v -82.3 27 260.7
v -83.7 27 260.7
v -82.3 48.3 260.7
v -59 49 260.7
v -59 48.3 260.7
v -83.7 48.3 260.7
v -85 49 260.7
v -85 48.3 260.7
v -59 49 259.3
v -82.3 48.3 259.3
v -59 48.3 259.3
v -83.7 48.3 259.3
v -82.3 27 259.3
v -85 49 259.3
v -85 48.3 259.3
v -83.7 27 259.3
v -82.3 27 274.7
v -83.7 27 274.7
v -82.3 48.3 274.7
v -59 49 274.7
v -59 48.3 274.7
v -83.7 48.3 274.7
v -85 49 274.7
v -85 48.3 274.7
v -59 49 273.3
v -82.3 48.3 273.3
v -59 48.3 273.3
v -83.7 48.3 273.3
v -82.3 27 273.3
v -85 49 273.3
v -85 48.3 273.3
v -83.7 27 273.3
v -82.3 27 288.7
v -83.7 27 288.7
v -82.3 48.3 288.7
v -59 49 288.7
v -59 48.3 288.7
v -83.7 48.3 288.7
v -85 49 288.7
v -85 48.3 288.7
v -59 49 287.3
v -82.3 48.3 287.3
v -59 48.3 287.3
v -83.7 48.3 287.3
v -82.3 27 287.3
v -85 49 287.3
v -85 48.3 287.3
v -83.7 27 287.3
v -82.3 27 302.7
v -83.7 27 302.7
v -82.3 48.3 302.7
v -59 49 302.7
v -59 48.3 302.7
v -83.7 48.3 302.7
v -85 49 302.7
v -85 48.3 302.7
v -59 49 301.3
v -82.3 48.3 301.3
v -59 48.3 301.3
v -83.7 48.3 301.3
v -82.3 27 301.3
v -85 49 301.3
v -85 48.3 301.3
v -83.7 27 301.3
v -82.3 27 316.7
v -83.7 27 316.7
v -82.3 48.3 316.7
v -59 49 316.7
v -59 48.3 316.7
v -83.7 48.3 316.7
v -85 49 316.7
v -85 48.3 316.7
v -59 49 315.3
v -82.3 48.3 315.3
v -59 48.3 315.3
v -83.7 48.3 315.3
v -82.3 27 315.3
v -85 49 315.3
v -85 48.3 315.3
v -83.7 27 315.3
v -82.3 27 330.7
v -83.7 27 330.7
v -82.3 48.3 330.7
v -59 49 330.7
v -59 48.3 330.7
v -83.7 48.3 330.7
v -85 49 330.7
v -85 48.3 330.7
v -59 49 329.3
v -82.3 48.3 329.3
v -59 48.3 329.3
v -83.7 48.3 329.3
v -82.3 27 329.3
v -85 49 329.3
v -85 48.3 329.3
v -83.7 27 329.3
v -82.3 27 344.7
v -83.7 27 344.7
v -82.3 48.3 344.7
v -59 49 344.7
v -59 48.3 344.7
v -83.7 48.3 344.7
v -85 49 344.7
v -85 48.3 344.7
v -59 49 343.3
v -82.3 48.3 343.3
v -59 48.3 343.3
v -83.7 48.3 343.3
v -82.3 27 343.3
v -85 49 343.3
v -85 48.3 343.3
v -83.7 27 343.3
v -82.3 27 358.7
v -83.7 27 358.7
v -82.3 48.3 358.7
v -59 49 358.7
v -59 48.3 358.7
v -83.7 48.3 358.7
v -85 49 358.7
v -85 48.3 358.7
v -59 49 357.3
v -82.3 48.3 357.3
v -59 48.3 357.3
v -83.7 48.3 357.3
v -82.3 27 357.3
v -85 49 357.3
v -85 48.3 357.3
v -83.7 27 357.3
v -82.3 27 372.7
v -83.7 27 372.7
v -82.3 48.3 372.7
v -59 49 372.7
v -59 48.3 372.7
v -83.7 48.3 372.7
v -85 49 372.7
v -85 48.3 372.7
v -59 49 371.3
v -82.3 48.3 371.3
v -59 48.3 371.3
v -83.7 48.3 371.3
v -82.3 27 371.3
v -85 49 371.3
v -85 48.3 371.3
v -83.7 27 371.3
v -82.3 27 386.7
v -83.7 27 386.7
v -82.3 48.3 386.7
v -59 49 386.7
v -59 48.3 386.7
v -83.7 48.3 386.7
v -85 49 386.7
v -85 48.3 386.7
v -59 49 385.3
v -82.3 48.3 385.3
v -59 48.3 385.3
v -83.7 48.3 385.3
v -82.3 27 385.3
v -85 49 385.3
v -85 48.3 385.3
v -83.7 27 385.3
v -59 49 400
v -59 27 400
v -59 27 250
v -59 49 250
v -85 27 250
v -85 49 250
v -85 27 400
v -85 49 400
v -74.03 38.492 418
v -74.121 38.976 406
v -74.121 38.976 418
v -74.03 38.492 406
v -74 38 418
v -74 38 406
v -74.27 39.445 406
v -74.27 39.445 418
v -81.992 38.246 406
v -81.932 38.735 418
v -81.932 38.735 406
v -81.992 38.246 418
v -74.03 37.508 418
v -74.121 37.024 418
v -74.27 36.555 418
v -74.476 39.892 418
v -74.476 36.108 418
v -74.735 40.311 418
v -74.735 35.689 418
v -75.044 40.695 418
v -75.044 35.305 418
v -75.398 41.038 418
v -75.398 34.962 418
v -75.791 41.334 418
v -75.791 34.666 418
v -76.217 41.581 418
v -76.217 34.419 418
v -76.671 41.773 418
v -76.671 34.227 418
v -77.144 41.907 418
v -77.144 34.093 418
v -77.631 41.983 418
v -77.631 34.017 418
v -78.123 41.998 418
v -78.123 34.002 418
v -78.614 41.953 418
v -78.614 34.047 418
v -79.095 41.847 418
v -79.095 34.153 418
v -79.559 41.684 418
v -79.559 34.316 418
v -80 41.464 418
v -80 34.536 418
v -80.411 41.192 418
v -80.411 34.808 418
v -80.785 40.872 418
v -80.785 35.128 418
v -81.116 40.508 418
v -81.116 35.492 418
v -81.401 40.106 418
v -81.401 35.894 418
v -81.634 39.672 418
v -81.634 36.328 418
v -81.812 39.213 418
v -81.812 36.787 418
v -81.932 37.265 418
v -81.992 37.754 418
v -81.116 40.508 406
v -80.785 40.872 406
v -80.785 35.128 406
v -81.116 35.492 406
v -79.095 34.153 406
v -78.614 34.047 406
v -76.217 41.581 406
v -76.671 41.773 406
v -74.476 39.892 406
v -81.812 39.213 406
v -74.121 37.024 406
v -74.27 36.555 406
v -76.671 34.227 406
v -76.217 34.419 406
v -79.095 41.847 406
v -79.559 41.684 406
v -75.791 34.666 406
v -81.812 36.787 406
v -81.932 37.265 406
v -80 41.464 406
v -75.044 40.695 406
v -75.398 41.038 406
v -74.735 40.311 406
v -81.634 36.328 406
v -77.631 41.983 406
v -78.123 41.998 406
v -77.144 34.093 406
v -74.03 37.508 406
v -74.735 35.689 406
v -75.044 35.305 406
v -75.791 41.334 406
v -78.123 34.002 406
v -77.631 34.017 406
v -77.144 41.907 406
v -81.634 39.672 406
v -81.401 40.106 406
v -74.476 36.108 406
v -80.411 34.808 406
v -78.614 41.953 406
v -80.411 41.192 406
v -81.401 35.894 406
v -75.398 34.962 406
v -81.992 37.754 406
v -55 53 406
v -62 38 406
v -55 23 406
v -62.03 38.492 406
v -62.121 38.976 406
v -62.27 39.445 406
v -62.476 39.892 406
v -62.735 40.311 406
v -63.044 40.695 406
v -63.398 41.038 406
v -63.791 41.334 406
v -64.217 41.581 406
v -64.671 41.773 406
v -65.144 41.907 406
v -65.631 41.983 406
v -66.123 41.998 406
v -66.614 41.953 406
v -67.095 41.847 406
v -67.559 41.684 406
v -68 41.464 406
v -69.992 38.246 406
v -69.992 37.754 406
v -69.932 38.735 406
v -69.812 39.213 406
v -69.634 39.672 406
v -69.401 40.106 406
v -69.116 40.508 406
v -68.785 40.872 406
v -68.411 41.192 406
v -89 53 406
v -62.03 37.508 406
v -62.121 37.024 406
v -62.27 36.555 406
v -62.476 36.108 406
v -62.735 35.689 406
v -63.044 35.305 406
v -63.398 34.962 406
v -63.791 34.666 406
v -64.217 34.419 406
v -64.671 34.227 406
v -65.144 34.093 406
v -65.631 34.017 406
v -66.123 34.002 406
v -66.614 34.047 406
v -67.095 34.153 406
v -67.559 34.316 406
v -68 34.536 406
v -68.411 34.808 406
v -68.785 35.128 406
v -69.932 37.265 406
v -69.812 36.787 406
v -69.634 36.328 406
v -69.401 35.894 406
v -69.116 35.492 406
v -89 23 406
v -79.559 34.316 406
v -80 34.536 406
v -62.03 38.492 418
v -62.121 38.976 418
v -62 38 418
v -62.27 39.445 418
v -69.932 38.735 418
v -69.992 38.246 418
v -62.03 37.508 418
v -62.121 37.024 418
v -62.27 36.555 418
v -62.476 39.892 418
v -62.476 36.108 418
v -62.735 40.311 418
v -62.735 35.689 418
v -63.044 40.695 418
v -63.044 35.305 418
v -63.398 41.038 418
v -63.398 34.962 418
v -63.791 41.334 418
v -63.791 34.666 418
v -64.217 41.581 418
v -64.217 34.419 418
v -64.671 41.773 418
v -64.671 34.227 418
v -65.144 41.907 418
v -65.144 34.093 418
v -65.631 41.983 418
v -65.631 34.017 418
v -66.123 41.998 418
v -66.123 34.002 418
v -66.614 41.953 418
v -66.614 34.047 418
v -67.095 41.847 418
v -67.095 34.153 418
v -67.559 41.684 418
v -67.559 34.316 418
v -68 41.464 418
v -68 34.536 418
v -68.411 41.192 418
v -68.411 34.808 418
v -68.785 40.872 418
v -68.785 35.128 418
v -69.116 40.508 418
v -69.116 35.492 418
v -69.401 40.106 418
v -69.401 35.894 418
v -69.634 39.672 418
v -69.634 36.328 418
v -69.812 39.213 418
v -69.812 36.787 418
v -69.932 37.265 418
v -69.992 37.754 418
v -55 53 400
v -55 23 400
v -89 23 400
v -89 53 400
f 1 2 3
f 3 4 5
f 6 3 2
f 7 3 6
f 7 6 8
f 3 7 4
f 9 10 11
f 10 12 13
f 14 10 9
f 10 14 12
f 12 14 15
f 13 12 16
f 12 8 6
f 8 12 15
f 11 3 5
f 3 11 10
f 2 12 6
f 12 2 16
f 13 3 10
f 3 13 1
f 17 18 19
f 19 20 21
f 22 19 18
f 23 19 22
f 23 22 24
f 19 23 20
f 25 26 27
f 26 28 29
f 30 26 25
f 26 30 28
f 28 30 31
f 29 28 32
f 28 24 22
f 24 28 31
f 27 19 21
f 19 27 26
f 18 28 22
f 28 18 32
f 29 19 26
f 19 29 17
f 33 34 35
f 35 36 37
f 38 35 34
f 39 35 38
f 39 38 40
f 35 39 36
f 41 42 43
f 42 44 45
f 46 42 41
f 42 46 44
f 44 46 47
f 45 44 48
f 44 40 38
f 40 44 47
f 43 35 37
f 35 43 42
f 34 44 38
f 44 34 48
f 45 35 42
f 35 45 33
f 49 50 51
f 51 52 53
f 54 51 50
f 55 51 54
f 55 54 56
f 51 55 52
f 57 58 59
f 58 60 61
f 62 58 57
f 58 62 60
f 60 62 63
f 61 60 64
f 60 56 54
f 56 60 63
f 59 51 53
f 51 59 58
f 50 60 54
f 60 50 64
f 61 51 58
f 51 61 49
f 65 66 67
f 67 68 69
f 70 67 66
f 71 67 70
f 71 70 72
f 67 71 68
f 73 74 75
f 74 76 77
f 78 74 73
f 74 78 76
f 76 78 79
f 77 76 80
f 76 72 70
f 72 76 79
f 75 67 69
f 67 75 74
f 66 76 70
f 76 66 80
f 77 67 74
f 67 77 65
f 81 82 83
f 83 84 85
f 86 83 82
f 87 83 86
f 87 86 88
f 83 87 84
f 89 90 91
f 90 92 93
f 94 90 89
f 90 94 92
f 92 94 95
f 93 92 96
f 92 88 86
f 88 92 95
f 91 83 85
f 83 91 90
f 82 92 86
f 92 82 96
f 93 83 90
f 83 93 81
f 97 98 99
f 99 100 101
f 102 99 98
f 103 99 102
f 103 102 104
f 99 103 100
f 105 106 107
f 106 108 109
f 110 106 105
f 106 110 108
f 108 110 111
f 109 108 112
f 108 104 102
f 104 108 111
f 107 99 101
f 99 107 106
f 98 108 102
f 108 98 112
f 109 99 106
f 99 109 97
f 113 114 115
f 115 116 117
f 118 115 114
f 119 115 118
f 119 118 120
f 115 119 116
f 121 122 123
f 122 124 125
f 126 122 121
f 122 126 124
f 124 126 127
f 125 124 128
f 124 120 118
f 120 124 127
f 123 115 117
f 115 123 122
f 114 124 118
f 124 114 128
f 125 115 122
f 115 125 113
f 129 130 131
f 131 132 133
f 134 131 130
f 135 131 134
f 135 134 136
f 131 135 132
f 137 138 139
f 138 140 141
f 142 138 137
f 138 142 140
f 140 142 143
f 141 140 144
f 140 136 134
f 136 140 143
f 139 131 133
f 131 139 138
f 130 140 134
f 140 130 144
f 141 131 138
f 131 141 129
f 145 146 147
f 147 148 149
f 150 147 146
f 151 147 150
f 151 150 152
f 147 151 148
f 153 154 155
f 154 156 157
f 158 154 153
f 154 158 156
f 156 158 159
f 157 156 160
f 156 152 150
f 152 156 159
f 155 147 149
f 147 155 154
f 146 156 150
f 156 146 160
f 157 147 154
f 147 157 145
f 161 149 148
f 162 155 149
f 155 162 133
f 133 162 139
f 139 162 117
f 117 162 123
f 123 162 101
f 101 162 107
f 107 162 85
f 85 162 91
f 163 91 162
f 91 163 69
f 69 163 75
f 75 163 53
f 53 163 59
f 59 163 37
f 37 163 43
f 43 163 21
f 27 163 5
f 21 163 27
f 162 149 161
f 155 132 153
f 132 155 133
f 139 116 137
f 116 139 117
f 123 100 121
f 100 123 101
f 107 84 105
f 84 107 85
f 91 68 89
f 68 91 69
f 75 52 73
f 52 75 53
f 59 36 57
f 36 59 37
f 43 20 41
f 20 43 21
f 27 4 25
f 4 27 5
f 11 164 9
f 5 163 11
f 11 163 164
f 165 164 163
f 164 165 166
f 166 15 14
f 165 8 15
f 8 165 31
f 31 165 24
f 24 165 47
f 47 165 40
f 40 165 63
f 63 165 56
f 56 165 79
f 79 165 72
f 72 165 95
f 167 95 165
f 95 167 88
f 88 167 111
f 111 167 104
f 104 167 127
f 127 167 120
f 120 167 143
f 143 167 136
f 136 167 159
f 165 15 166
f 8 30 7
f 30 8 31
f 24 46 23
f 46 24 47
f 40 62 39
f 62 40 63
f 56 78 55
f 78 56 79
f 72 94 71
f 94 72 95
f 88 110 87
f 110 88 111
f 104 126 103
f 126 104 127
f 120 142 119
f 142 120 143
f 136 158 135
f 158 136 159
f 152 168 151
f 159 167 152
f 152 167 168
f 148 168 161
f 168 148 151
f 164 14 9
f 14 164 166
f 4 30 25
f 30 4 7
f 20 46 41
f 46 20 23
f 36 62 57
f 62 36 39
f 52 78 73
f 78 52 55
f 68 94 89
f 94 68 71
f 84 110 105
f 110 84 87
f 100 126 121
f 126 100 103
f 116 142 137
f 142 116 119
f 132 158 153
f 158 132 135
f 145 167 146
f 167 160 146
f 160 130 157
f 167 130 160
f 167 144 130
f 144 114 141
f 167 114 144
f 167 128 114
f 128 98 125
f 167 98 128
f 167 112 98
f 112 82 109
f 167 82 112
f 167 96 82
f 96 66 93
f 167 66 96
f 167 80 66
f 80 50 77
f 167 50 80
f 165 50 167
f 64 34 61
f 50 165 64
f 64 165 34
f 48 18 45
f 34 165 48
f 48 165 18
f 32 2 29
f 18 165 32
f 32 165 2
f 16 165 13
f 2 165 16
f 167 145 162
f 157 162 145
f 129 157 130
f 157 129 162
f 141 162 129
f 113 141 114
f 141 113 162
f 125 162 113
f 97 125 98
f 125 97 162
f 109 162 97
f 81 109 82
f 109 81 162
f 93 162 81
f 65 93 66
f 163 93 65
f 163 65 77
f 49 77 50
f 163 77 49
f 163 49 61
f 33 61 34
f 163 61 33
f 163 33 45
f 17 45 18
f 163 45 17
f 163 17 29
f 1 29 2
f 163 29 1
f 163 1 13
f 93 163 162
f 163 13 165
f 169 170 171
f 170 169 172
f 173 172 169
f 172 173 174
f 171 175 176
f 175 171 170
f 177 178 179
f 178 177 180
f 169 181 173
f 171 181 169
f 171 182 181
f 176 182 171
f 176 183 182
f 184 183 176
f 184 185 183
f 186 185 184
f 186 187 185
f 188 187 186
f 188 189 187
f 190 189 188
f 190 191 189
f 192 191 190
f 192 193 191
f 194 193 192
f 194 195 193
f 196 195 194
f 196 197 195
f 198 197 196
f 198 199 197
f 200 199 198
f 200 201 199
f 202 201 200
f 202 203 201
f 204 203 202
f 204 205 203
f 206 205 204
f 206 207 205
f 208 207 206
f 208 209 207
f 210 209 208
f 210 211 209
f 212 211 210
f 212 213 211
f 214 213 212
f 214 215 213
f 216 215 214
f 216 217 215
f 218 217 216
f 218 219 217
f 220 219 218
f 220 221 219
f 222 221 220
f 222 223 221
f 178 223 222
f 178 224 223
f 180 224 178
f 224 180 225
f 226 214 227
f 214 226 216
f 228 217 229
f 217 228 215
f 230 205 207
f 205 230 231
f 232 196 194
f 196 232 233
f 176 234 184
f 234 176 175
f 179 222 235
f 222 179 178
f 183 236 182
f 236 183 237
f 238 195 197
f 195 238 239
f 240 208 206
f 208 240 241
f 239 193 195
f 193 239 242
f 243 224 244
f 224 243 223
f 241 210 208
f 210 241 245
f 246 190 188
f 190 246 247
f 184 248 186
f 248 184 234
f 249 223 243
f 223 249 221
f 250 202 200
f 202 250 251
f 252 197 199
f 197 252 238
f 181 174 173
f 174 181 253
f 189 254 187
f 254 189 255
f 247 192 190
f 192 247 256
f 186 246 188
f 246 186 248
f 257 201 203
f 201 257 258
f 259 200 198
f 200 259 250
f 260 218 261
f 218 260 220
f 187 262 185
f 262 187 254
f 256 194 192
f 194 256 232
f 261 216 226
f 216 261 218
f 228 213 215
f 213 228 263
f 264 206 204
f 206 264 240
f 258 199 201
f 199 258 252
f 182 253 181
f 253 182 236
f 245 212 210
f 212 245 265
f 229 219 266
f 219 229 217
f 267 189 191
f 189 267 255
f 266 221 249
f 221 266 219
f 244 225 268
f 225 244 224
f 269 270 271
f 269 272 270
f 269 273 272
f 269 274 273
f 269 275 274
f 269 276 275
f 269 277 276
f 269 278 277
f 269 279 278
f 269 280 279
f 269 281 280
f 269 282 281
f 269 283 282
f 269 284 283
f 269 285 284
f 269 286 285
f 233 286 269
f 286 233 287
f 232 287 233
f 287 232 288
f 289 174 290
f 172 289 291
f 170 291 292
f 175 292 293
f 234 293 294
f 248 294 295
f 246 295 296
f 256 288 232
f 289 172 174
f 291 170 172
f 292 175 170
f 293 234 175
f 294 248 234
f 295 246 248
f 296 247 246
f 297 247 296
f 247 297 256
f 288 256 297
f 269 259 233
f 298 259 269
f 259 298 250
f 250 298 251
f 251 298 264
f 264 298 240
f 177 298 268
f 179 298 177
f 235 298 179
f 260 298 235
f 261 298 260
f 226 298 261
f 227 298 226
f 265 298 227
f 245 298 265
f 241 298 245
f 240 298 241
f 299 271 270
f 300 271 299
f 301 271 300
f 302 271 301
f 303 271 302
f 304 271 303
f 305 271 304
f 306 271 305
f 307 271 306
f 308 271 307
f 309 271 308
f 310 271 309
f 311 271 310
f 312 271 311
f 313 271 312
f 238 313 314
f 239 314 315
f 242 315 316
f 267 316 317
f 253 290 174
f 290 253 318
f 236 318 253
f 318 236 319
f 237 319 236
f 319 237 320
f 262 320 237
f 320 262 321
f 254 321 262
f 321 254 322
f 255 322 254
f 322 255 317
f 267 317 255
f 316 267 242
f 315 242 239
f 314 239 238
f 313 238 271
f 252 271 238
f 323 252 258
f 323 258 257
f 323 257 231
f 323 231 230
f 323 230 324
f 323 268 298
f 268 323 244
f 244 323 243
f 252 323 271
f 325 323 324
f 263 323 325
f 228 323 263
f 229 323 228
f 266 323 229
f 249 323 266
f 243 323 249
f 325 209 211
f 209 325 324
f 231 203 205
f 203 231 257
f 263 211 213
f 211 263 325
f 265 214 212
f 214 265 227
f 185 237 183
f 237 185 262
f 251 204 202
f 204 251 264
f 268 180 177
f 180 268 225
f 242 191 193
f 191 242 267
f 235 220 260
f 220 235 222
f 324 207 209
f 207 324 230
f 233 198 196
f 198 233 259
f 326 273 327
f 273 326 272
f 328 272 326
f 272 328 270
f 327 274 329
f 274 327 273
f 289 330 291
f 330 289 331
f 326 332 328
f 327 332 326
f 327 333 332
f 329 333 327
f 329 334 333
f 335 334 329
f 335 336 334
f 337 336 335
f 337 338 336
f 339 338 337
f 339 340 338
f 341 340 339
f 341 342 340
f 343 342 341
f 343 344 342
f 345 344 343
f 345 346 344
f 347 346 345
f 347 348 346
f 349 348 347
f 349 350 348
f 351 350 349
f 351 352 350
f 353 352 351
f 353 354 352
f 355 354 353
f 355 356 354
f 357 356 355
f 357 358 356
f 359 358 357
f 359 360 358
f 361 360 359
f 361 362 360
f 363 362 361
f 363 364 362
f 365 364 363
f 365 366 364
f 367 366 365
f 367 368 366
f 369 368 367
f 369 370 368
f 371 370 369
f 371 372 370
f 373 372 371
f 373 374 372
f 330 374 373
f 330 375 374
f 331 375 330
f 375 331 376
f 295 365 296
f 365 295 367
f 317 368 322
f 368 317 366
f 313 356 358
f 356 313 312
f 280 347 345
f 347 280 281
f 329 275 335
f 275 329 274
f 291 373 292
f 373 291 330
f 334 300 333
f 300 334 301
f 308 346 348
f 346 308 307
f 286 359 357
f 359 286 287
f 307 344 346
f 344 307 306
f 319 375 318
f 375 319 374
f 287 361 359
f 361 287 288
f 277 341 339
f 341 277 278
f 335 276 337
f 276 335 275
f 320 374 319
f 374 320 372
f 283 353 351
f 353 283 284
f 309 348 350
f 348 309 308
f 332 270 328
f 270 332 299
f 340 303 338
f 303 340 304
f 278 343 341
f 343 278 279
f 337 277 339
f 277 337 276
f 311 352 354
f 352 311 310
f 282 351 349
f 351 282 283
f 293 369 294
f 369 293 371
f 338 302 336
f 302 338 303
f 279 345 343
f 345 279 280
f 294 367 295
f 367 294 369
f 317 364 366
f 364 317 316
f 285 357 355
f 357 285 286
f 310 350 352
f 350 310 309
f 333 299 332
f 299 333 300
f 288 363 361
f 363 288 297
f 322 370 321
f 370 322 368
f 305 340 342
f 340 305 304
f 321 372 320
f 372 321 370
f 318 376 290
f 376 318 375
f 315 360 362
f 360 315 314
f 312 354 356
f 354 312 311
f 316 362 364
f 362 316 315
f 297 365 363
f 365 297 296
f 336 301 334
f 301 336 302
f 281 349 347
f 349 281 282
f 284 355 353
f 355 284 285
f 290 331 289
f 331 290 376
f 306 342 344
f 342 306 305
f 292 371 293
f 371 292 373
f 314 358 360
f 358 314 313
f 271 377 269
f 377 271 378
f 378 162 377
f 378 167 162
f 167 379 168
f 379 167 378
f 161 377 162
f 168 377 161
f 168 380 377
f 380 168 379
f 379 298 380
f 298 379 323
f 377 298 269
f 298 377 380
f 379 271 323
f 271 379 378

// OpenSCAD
// file: common.scad
// Shared parameters and placement helpers for the dollhouse.
// `include`d by every component file so variables AND helper modules propagate.

$fa = 2;
$fs = 0.5;
eps = 0.1;

// ---- Core house dimensions (mm) ----
house_w = 240;          // width  (X)
house_d = 170;          // depth  (Y)
wall_t  = 8;            // exterior wall thickness
floor_h = 130;          // interior storey height
mid_t   = 8;            // mid-floor slab thickness
wall_height = floor_h * 2 + mid_t;   // 268
half_depth  = house_d / 2;           // 85

// ---- Roof ----
gable_rise = 95;
ridge_z    = wall_height + gable_rise;   // 363
over_x     = 18;        // gable-end overhang
over_y     = 18;        // eave overhang
roof_w     = house_w + 2 * over_x;       // 276
roof_t     = 9;
ridge_r    = 7;
theta      = atan(gable_rise / half_depth);
panel_len  = (half_depth + over_y) / cos(theta);

// ---- Foundation ----
foundation_h    = 18;
foundation_over = 14;

// ---- Windows ----
win_w   = 42;
win_h   = 58;
frame_w = 6;
frame_t_out = 5;        // how far trim/frame protrudes outside
mull_w  = 3;
ground_z = 67;          // window centre, ground floor
upper_z  = 201;         // window centre, upper floor

// ---- Door ----
door_w = 56;
door_h = 104;

// ---- Chimney ----
chimney_w   = 26;
chimney_d   = 22;
chimney_x   = -72;
chimney_y   = 38;
chimney_base_z = 250;
chimney_top = ridge_z + 40;   // 403

// ---- Window / opening placement lists [u, z_centre] ----
front_windows = [[-80, ground_z], [80, ground_z],
                 [-80, upper_z], [0, upper_z], [80, upper_z]];
back_windows  = [[-80, ground_z], [80, ground_z],
                 [-80, upper_z], [80, upper_z]];
side_windows  = [[-40, ground_z], [40, ground_z],
                 [-40, upper_z], [40, upper_z]];

// ---- Colours ----
col_wall    = "#F2E7CE";
col_roof    = "#9B3B2E";
col_trim    = "#FBFBF7";
col_door    = "#3C5A78";
col_found   = "#9A968E";
col_glass   = "#AFC9DE";
col_chimney = "#A14B36";
col_shutter = "#46603F";
col_stair   = "#C8A97E";

// ---- Helpers ----------------------------------------------------------

// Position children flush against a given exterior face, local +Y = outward.
module place_on_face(face, u, z) {
    if (face == "front")
        translate([u, half_depth, z]) children();
    else if (face == "back")
        translate([u, -half_depth, z]) rotate([0, 0, 180]) children();
    else if (face == "left")
        translate([-house_w / 2, u, z]) rotate([0, 0, 90]) children();
    else
        translate([house_w / 2, u, z]) rotate([0, 0, -90]) children();
}

// Solid that pierces a wall to make a window/door opening.
module opening_cut(face, u, z, w, h) {
    if (face == "front")
        translate([u, half_depth - wall_t / 2, z])
            cube([w, wall_t + 4, h], center = true);
    else if (face == "back")
        translate([u, -(half_depth - wall_t / 2), z])
            cube([w, wall_t + 4, h], center = true);
    else if (face == "left")
        translate([-(house_w / 2 - wall_t / 2), u, z])
            cube([wall_t + 4, w, h], center = true);
    else
        translate([house_w / 2 - wall_t / 2, u, z])
            cube([wall_t + 4, w, h], center = true);
}
// main file
include <common.scad>

// Brick chimney rising through the rear roof slope, with a capstone
// and two flue pots.
module chimney() {
    h = chimney_top - chimney_base_z;
    color(col_chimney)
        translate([chimney_x, chimney_y, chimney_base_z])
            difference() {
                brick_stack([chimney_w, chimney_d, h]);
            }
    // Capstone
    color(col_found)
        translate([chimney_x, chimney_y, chimney_top])
            cube([chimney_w + 8, chimney_d + 8, 6], center = true);
    // Flue pots
    for (fx = [-1, 1])
        color("#7C3A2A")
            translate([chimney_x + fx * 6, chimney_y, chimney_top + 3])
                cylinder(h = 12, r = 4);
}

// Box with shallow horizontal grooves to read as brick courses.
module brick_stack(dims) {
    difference() {
        translate([0, 0, dims[2] / 2])
            cube(dims, center = true);
        for (z = [10 : 14 : dims[2] - 6])
            translate([0, 0, z])
                for (f = [0, 1])
                    rotate([0, 0, f * 90])
                        translate([0, dims[1] / 2, 0])
                            cube([dims[0] + 2, 1.4, 1.4], center = true);
    }
}

chimney();
